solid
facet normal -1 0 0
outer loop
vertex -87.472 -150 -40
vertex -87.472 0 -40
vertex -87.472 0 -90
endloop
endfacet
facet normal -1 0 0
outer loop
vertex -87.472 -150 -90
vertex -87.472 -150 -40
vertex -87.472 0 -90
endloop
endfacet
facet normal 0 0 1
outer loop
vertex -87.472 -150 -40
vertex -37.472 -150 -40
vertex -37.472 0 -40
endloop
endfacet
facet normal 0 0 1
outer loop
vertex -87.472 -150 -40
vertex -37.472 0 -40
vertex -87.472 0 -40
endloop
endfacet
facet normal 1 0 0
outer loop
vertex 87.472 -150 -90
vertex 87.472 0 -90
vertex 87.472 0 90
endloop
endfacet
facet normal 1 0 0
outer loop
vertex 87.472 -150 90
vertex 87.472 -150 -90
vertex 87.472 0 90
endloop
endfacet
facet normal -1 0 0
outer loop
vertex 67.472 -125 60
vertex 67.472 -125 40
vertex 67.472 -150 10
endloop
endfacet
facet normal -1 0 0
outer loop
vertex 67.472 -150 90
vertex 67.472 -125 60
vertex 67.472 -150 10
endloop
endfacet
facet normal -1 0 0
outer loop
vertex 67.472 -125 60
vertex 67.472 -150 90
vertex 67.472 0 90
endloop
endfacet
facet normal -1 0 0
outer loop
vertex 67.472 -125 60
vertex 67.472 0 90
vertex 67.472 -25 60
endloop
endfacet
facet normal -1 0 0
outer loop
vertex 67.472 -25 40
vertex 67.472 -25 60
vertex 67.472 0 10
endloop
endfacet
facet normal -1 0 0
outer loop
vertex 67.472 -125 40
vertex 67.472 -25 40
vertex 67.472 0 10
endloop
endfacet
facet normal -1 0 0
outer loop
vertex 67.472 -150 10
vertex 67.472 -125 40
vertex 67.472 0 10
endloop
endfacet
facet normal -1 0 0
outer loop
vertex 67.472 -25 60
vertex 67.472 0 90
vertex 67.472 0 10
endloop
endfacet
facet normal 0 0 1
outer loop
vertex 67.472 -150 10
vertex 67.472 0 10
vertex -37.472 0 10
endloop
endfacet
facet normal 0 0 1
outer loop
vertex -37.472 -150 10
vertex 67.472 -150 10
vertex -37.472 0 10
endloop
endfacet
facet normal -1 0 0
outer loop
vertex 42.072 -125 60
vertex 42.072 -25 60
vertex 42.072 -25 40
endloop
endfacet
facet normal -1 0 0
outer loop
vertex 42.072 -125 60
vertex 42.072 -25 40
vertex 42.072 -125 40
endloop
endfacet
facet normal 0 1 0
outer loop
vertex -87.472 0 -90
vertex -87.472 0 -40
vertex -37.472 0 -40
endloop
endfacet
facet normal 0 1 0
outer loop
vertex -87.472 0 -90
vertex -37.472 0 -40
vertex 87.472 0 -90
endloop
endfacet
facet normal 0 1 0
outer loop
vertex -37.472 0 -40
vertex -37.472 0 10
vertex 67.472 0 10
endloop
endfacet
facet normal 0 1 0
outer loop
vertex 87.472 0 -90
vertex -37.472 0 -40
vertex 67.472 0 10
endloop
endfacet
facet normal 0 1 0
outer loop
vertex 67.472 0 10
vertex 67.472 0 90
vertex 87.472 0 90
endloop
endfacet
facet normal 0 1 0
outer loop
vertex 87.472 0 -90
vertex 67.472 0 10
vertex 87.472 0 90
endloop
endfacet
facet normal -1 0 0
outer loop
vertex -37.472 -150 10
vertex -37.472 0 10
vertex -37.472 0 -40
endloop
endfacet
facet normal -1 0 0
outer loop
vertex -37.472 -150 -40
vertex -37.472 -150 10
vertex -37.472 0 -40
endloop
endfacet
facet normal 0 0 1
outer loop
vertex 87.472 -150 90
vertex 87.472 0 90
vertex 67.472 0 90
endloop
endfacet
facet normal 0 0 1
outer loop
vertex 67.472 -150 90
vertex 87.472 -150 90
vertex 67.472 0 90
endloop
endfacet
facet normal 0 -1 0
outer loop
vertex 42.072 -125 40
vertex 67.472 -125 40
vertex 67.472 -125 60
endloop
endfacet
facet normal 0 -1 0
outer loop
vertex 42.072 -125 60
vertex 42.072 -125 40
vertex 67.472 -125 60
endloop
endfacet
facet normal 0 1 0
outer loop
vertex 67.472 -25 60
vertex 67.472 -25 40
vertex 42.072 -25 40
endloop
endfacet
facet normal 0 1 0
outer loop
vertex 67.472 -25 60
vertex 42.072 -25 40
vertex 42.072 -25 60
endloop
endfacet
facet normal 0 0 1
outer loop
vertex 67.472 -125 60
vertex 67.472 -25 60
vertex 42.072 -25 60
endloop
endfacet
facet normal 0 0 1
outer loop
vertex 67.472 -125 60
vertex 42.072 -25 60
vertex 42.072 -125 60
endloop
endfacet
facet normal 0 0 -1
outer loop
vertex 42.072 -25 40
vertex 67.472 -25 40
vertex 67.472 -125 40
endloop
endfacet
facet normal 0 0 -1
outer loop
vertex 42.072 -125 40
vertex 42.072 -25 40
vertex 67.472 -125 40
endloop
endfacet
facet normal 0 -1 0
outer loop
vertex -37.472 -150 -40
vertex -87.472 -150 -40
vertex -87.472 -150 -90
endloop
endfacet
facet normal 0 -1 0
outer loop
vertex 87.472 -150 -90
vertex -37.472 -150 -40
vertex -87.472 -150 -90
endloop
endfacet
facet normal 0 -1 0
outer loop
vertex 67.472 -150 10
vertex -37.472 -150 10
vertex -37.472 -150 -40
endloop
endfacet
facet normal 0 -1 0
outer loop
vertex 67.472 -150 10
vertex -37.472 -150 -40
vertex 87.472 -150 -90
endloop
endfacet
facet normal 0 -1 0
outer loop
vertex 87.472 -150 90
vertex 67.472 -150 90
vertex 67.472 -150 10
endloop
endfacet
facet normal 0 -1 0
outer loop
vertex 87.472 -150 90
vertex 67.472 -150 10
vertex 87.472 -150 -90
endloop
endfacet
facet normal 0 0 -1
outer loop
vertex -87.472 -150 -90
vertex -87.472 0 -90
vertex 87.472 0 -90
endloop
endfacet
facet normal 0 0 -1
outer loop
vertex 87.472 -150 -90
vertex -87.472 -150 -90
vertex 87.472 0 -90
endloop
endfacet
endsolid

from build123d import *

# Parameters (mm, degrees)
F1_DEPTH = 150
F2_W     = 100
F2_H     = 20
F3_DEPTH = 25.4


with BuildPart() as f1:
    # F0 (on Front) → F1 (new body)
    with BuildSketch(Plane.XZ):
        Polygon((87.471645, 90), (67.471645, 90), (67.471645, 10), (-37.471645, 10), (-37.471645, -40), (-87.471645, -40), (-87.471645, -90), (87.471645, -90), align=None)
    extrude(amount=F1_DEPTH)

    # F2 (on face) → F3 (join)
    with BuildSketch(Plane(origin=(67.471645, 0, 0), x_dir=(0, -1, 0), z_dir=(-1, 0, 0))):
        with Locations((75, 50)):
            Rectangle(F2_W, F2_H)
    extrude(amount=F3_DEPTH)


solid = f1.part
